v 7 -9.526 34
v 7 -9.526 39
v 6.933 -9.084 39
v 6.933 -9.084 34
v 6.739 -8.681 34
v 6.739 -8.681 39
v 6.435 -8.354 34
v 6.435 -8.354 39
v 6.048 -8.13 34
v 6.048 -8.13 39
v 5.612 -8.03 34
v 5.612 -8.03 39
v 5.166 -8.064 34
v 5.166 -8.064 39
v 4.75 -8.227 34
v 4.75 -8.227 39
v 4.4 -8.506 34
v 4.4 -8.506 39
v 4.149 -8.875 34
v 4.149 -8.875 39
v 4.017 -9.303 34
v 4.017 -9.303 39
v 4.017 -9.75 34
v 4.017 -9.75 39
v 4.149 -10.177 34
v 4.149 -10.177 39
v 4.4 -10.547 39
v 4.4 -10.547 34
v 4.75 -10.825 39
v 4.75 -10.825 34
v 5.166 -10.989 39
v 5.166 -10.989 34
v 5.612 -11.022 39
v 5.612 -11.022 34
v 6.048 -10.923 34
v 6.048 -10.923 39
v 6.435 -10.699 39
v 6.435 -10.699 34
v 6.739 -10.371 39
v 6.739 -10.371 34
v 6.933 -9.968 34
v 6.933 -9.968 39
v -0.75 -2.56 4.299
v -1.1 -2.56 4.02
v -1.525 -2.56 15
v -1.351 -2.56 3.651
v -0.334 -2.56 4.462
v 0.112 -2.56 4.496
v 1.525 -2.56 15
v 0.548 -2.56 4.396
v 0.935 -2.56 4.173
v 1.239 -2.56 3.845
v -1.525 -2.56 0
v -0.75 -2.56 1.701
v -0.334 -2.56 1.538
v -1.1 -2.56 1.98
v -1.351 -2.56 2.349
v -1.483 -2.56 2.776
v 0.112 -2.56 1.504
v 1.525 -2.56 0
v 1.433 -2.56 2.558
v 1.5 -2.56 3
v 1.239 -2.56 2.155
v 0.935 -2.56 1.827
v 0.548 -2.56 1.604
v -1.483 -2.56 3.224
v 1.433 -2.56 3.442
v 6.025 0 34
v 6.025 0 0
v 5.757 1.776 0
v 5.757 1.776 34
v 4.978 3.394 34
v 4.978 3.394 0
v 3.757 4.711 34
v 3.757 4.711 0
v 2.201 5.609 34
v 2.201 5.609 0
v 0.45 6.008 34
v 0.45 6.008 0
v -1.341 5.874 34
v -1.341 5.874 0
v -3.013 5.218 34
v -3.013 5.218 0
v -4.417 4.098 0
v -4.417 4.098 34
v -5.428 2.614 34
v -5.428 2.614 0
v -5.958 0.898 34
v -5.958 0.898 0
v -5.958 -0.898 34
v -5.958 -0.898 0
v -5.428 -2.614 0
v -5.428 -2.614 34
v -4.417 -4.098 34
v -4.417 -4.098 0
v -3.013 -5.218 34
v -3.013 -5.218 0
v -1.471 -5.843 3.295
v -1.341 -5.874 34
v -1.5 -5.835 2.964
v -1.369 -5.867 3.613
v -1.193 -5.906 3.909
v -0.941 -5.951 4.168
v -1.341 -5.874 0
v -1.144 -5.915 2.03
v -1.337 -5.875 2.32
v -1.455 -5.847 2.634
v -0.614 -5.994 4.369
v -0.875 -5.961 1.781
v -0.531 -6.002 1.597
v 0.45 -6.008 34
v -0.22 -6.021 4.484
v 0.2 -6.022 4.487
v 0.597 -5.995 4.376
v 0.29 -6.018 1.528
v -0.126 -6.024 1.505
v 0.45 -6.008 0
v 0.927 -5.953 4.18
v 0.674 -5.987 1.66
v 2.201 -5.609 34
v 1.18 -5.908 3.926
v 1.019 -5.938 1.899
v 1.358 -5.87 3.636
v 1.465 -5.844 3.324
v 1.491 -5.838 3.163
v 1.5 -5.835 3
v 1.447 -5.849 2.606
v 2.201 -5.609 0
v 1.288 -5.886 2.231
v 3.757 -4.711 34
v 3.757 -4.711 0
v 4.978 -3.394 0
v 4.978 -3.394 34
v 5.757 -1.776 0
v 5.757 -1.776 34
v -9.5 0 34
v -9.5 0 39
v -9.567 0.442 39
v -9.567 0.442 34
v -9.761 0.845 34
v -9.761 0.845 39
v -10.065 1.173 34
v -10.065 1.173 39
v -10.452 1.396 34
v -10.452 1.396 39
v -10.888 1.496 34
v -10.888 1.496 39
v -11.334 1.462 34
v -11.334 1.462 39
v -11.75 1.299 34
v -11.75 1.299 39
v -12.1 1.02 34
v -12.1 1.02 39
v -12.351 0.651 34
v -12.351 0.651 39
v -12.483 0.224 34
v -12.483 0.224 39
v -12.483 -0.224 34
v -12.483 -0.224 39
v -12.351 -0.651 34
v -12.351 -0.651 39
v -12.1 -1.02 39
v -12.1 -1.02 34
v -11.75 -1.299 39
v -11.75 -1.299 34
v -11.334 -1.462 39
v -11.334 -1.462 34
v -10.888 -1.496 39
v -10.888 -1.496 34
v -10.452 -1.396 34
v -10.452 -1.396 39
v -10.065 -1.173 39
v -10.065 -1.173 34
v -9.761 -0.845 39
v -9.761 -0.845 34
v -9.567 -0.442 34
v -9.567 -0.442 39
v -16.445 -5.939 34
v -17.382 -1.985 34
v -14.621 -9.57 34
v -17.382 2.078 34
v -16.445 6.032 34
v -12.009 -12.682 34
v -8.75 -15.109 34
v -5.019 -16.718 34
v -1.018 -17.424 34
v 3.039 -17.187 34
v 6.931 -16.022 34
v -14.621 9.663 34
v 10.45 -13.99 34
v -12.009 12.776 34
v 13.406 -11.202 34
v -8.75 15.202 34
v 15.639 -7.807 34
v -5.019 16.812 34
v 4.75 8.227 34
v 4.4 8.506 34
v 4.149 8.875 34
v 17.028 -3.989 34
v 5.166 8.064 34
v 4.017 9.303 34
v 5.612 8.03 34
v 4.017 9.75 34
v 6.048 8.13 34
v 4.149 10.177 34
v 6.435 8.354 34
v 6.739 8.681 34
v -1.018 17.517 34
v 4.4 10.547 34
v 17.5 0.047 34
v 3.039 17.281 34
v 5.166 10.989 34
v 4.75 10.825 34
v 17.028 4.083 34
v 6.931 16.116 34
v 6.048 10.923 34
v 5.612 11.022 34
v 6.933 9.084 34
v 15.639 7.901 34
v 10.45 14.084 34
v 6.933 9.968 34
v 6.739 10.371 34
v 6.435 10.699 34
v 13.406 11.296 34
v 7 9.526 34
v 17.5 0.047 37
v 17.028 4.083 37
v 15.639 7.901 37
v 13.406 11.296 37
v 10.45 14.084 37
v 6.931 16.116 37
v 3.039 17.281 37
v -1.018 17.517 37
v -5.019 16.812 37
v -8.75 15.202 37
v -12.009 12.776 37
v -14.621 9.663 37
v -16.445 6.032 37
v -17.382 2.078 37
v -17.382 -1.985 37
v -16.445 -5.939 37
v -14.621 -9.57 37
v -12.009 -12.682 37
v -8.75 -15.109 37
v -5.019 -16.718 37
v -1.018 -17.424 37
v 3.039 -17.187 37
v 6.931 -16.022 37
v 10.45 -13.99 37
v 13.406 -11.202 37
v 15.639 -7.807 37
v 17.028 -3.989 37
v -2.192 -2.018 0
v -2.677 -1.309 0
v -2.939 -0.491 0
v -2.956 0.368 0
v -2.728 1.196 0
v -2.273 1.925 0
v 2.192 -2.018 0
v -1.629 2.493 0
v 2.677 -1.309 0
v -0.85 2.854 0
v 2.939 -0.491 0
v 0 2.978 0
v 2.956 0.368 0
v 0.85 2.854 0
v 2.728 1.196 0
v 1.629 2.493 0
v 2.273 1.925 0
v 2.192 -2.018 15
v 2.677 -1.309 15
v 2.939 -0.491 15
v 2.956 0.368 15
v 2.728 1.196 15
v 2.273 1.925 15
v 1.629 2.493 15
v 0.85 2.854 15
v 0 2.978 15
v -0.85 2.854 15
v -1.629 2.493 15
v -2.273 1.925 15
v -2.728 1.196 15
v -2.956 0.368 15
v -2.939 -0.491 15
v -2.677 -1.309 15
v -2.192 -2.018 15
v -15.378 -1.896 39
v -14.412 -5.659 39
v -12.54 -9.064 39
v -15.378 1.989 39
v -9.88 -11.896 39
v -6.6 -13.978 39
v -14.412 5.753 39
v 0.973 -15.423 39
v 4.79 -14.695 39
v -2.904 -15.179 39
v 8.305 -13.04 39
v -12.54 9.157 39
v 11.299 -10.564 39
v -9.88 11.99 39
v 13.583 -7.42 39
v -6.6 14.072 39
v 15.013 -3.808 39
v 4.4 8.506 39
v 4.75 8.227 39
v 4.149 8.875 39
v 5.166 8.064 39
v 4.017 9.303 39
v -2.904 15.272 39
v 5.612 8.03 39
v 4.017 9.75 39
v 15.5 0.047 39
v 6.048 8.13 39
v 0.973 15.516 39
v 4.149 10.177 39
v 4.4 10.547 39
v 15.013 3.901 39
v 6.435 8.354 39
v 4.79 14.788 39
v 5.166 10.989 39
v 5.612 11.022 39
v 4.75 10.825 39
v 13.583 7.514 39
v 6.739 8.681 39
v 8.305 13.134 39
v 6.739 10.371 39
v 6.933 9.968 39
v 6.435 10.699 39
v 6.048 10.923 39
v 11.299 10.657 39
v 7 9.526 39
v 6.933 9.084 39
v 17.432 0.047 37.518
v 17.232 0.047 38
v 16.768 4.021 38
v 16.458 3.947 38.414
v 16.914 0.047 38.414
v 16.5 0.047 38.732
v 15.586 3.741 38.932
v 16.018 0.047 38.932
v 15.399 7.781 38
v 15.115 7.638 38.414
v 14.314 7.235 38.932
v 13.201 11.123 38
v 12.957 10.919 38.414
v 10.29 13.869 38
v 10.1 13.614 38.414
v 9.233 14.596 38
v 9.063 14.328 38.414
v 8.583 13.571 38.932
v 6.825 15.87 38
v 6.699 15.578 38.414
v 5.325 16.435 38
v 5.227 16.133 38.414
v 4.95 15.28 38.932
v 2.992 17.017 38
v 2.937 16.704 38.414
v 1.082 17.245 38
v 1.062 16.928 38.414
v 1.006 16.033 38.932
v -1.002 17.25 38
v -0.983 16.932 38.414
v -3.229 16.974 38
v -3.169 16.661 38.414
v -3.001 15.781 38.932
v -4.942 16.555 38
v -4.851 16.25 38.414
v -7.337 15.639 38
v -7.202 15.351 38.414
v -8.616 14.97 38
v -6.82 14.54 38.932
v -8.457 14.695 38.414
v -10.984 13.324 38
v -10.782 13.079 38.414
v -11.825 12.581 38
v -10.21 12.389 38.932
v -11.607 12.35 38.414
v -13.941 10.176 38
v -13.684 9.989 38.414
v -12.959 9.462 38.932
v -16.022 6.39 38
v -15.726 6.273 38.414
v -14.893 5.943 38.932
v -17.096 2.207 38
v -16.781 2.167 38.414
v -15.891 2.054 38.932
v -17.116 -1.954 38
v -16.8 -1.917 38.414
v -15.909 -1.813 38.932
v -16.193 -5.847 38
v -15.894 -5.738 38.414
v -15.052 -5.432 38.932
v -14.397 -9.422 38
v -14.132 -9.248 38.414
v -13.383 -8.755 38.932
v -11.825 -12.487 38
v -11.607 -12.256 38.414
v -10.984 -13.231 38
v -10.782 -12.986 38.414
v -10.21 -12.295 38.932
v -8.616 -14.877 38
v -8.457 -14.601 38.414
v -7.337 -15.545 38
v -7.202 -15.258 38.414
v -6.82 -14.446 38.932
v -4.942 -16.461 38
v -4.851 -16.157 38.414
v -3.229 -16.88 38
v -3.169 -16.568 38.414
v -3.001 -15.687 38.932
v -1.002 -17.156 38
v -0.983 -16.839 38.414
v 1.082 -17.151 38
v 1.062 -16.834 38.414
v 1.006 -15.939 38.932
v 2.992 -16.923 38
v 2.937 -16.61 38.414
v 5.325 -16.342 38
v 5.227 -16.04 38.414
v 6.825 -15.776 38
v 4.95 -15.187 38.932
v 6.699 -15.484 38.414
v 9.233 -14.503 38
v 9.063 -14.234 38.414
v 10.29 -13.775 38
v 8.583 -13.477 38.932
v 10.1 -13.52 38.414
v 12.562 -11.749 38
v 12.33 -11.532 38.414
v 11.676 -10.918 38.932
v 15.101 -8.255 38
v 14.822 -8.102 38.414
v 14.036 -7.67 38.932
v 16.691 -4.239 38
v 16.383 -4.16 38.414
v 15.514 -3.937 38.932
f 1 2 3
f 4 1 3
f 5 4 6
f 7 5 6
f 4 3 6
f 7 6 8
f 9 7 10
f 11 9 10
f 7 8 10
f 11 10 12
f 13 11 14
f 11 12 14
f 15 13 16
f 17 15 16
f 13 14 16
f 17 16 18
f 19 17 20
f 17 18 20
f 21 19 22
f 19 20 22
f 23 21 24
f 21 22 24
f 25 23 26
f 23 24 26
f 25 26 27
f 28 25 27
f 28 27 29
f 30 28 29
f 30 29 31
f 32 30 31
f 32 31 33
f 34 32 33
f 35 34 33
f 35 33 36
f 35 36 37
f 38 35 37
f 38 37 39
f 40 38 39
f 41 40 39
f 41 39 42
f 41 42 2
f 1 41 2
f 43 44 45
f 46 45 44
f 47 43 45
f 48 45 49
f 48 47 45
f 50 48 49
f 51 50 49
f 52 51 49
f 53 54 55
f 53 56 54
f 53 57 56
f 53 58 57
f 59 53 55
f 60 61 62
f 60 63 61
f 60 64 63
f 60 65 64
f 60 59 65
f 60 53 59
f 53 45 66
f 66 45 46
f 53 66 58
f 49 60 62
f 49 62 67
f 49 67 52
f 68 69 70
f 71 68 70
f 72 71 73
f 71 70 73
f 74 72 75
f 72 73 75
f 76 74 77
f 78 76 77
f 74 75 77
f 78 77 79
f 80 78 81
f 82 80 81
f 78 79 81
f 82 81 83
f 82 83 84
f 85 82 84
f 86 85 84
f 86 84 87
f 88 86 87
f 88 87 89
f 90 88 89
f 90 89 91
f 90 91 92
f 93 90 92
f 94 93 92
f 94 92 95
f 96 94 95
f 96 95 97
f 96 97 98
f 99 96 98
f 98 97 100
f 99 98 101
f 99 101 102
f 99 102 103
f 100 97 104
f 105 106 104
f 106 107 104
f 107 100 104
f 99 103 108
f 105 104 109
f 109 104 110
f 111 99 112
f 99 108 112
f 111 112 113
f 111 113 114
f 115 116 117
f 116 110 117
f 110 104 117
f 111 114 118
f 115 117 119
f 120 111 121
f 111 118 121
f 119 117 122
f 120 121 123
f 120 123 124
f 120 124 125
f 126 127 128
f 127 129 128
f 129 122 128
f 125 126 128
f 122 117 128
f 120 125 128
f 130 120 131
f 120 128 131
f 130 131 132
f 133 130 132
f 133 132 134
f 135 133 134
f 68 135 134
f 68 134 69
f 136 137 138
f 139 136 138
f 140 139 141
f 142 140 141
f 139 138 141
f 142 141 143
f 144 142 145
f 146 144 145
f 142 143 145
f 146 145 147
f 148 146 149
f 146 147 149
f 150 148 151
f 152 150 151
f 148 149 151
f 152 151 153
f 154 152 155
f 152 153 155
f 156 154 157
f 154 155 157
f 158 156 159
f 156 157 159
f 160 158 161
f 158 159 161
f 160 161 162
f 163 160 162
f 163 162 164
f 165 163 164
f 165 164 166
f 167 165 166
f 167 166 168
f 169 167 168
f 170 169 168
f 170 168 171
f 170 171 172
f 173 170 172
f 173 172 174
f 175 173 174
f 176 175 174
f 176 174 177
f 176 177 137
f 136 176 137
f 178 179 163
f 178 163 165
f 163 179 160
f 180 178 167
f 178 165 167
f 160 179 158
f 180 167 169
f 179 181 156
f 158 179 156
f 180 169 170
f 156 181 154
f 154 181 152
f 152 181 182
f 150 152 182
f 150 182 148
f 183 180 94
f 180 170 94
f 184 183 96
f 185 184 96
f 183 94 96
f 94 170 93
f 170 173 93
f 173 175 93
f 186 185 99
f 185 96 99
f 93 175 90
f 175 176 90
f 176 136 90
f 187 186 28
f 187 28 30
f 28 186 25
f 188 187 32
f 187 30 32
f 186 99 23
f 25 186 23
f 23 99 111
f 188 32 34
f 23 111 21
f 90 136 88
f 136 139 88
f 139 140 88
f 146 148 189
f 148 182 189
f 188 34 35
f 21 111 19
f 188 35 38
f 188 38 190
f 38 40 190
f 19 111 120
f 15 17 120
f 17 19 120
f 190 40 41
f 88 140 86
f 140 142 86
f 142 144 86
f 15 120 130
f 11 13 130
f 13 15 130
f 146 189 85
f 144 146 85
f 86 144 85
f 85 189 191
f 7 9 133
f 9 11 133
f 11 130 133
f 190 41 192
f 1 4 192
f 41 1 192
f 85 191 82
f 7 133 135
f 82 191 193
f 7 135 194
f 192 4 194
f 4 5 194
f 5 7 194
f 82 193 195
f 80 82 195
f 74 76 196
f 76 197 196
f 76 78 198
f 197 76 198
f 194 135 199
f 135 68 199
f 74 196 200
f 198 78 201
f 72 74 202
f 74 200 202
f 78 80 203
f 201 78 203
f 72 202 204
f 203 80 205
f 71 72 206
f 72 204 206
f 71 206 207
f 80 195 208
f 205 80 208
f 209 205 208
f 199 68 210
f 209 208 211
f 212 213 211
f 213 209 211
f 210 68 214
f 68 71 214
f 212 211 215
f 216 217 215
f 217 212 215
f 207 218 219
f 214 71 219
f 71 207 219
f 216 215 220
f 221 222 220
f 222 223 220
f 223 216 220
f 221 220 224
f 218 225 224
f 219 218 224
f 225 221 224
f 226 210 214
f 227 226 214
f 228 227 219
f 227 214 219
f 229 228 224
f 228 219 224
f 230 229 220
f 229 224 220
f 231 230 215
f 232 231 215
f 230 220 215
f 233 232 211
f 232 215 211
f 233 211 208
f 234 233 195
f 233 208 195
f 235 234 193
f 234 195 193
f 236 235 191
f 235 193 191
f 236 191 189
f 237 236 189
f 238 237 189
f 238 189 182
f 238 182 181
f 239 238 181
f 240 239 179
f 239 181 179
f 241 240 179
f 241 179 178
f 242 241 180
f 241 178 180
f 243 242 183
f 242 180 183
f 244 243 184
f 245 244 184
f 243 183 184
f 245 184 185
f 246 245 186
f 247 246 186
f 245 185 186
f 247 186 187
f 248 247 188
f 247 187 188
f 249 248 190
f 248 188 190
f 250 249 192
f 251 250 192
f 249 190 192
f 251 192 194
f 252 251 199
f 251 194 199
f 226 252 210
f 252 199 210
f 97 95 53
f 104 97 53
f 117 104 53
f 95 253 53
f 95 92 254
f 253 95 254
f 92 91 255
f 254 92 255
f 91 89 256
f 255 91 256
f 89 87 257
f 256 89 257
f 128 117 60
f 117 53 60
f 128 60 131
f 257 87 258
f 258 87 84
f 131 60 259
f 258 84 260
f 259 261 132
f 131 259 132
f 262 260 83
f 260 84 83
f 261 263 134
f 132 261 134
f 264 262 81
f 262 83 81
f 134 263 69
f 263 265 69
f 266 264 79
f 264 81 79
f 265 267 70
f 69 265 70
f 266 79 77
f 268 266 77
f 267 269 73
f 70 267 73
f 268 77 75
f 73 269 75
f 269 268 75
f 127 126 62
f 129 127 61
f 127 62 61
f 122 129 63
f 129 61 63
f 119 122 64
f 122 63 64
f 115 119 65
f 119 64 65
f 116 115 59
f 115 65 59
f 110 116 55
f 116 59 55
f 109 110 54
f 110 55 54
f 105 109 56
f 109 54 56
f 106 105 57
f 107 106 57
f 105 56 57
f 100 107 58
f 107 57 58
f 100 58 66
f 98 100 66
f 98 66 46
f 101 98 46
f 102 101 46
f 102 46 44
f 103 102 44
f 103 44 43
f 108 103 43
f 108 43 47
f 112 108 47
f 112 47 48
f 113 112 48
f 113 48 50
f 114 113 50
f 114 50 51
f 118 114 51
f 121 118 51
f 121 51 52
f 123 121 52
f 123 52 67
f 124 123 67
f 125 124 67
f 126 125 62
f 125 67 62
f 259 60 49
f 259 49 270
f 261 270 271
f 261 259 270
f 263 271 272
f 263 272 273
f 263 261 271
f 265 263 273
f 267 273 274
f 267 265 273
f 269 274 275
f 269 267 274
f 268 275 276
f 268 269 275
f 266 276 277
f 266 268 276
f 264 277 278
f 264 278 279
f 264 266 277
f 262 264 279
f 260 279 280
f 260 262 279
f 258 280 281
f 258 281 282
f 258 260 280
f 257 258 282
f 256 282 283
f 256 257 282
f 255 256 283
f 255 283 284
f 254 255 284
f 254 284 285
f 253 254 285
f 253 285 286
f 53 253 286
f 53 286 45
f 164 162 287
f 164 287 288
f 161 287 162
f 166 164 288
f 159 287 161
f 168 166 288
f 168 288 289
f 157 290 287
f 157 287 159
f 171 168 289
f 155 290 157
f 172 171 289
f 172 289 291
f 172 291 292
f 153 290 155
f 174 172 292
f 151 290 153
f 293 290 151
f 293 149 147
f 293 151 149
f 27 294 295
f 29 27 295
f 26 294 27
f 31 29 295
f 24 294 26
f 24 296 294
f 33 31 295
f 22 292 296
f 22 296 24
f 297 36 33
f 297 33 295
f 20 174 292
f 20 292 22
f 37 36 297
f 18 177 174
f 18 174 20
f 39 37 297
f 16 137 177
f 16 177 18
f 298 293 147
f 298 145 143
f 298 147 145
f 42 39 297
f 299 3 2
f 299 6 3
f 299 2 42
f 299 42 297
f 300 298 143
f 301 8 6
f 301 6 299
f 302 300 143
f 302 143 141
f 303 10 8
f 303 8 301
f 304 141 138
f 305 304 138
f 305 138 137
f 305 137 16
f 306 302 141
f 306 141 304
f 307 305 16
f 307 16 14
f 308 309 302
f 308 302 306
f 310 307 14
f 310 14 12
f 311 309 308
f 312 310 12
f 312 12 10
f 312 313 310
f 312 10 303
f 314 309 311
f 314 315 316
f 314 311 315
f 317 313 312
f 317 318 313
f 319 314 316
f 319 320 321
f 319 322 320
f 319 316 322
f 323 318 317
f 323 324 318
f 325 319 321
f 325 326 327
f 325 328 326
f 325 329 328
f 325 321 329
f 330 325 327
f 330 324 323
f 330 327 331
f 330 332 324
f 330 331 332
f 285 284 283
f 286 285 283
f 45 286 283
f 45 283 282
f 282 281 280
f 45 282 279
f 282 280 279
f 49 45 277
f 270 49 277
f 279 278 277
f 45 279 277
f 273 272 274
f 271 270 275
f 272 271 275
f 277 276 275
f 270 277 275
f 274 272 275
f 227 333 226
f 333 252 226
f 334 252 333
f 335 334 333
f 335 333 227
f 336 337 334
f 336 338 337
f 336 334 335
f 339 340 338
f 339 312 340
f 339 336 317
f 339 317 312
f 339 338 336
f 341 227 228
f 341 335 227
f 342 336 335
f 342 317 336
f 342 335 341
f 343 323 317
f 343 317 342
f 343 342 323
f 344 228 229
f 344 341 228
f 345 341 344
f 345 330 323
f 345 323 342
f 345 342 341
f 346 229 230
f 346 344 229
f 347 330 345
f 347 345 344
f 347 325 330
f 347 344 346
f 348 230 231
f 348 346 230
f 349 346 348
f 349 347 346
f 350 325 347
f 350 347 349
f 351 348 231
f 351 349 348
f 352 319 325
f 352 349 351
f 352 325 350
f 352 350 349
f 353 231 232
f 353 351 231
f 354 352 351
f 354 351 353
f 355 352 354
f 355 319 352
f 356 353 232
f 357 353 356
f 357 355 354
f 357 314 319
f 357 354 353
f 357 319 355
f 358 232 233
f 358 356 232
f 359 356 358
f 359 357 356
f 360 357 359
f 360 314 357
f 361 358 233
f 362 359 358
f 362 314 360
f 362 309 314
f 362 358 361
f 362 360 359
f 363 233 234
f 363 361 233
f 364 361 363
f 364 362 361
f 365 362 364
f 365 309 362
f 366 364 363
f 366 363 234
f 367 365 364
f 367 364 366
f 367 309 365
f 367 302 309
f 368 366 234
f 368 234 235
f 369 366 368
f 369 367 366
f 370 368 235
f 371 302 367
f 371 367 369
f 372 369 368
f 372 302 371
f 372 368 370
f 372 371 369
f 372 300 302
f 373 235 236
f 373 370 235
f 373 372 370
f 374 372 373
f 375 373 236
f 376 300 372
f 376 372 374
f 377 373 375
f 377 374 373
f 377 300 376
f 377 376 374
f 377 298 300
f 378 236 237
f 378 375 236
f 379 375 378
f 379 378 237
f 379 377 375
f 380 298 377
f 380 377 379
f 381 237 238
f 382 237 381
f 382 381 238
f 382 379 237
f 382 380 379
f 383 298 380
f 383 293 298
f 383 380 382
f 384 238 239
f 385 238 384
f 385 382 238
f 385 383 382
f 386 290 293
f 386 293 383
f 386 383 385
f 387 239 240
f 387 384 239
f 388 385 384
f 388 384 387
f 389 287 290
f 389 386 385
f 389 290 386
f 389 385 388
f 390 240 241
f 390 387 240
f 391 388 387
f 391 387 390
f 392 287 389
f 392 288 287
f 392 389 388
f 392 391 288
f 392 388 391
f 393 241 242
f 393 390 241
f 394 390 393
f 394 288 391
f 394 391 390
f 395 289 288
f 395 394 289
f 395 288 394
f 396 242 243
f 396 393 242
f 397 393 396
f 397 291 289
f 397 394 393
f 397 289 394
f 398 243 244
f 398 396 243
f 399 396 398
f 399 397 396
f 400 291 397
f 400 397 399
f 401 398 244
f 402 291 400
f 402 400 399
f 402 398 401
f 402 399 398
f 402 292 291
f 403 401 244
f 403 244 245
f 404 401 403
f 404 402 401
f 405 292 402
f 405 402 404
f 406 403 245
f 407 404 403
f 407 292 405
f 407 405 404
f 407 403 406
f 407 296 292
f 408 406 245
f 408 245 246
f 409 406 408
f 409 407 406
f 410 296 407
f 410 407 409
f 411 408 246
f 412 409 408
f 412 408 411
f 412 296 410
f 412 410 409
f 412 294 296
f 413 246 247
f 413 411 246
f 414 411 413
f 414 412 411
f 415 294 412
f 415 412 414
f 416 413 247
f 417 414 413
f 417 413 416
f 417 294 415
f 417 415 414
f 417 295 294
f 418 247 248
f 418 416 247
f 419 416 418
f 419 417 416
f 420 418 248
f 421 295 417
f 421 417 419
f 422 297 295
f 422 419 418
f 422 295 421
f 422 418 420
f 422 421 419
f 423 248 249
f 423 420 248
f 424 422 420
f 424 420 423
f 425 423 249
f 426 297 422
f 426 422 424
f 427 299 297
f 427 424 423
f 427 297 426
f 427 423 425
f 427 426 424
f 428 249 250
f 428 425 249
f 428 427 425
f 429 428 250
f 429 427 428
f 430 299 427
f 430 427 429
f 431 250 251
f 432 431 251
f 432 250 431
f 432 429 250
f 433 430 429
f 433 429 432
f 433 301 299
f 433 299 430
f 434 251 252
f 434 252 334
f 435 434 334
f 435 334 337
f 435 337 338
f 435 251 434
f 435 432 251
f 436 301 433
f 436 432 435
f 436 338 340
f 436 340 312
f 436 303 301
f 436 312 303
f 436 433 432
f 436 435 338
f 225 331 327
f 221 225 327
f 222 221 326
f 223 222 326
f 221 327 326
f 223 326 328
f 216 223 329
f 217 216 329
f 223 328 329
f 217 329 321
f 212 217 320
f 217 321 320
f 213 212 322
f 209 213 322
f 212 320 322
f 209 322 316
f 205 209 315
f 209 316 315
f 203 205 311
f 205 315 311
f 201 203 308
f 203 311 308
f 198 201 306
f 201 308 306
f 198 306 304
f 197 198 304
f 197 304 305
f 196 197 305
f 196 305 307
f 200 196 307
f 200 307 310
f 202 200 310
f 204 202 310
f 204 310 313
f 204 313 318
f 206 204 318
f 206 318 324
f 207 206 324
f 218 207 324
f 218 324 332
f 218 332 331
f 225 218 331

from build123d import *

# Parameters (mm, degrees)
ESQUISSE1_R             = 6.025
BOSS_EXTRU_1_DEPTH      = 34
ESQUISSE2_R             = 17.5
BOSS_EXTRU_2_DEPTH      = 5
ESQUISSE4_R             = 1.5
ENL_V_MAT_EXTRU_1_DEPTH = 10
CONG_1_R                = 2
ENL_V_MAT_EXTRU_2_DEPTH = 15
ESQUISSE6_R             = 1.5
ENL_V_MAT_EXTRU_3_DEPTH = 7


with BuildPart() as part:
    # Esquisse1 → Boss.-Extru.1 (new body)
    with BuildSketch(Plane.XY):
        Circle(ESQUISSE1_R)
    extrude(amount=BOSS_EXTRU_1_DEPTH)

    # Esquisse2 → Boss.-Extru.2 (add)
    with BuildSketch(Plane.XY.offset(34)):
        with Locations((0, 0.046797103)):
            Circle(ESQUISSE2_R)
    extrude(amount=BOSS_EXTRU_2_DEPTH)

    # Esquisse4 → Enlèv. mat.-Extru.1 (cut)
    with BuildSketch(Plane.XY.offset(39)):
        with Locations((-11, 0)):
            Circle(ESQUISSE4_R)
        with Locations((5.5, 9.526279442)):
            Circle(ESQUISSE4_R)
        with Locations((5.5, -9.526279442)):
            Circle(ESQUISSE4_R)
    extrude(amount=-ENL_V_MAT_EXTRU_1_DEPTH, mode=Mode.SUBTRACT)

    # Congé1
    cong_1_edges = [part.edges().sort_by_distance(p)[0] for p in [
        (-17.5, 0.046797103, 39),
    ]]
    fillet(cong_1_edges, radius=CONG_1_R)

    # Esquisse5 → Enlèv. mat.-Extru.2 (cut)
    with BuildSketch(Plane(origin=(0, 0, 0), x_dir=(-1, 0, 0), z_dir=(0, 0, -1))):
        with BuildLine():
            Line((1.525385197, -2.56), (-1.525385197, -2.56))
            ThreePointArc((-1.525385197, -2.56), (0, 2.978234065), (1.525385197, -2.56))
        make_face()
    extrude(amount=-ENL_V_MAT_EXTRU_2_DEPTH, mode=Mode.SUBTRACT)

    # Esquisse6 → Enlèv. mat.-Extru.3 (cut)
    with BuildSketch(Plane(origin=(0, 0, 0), x_dir=(1, 0, 0), z_dir=(0, 1, 0))):
        with Locations((0, -3)):
            Circle(ESQUISSE6_R)
    extrude(amount=-ENL_V_MAT_EXTRU_3_DEPTH, mode=Mode.SUBTRACT)


solid = part.part
